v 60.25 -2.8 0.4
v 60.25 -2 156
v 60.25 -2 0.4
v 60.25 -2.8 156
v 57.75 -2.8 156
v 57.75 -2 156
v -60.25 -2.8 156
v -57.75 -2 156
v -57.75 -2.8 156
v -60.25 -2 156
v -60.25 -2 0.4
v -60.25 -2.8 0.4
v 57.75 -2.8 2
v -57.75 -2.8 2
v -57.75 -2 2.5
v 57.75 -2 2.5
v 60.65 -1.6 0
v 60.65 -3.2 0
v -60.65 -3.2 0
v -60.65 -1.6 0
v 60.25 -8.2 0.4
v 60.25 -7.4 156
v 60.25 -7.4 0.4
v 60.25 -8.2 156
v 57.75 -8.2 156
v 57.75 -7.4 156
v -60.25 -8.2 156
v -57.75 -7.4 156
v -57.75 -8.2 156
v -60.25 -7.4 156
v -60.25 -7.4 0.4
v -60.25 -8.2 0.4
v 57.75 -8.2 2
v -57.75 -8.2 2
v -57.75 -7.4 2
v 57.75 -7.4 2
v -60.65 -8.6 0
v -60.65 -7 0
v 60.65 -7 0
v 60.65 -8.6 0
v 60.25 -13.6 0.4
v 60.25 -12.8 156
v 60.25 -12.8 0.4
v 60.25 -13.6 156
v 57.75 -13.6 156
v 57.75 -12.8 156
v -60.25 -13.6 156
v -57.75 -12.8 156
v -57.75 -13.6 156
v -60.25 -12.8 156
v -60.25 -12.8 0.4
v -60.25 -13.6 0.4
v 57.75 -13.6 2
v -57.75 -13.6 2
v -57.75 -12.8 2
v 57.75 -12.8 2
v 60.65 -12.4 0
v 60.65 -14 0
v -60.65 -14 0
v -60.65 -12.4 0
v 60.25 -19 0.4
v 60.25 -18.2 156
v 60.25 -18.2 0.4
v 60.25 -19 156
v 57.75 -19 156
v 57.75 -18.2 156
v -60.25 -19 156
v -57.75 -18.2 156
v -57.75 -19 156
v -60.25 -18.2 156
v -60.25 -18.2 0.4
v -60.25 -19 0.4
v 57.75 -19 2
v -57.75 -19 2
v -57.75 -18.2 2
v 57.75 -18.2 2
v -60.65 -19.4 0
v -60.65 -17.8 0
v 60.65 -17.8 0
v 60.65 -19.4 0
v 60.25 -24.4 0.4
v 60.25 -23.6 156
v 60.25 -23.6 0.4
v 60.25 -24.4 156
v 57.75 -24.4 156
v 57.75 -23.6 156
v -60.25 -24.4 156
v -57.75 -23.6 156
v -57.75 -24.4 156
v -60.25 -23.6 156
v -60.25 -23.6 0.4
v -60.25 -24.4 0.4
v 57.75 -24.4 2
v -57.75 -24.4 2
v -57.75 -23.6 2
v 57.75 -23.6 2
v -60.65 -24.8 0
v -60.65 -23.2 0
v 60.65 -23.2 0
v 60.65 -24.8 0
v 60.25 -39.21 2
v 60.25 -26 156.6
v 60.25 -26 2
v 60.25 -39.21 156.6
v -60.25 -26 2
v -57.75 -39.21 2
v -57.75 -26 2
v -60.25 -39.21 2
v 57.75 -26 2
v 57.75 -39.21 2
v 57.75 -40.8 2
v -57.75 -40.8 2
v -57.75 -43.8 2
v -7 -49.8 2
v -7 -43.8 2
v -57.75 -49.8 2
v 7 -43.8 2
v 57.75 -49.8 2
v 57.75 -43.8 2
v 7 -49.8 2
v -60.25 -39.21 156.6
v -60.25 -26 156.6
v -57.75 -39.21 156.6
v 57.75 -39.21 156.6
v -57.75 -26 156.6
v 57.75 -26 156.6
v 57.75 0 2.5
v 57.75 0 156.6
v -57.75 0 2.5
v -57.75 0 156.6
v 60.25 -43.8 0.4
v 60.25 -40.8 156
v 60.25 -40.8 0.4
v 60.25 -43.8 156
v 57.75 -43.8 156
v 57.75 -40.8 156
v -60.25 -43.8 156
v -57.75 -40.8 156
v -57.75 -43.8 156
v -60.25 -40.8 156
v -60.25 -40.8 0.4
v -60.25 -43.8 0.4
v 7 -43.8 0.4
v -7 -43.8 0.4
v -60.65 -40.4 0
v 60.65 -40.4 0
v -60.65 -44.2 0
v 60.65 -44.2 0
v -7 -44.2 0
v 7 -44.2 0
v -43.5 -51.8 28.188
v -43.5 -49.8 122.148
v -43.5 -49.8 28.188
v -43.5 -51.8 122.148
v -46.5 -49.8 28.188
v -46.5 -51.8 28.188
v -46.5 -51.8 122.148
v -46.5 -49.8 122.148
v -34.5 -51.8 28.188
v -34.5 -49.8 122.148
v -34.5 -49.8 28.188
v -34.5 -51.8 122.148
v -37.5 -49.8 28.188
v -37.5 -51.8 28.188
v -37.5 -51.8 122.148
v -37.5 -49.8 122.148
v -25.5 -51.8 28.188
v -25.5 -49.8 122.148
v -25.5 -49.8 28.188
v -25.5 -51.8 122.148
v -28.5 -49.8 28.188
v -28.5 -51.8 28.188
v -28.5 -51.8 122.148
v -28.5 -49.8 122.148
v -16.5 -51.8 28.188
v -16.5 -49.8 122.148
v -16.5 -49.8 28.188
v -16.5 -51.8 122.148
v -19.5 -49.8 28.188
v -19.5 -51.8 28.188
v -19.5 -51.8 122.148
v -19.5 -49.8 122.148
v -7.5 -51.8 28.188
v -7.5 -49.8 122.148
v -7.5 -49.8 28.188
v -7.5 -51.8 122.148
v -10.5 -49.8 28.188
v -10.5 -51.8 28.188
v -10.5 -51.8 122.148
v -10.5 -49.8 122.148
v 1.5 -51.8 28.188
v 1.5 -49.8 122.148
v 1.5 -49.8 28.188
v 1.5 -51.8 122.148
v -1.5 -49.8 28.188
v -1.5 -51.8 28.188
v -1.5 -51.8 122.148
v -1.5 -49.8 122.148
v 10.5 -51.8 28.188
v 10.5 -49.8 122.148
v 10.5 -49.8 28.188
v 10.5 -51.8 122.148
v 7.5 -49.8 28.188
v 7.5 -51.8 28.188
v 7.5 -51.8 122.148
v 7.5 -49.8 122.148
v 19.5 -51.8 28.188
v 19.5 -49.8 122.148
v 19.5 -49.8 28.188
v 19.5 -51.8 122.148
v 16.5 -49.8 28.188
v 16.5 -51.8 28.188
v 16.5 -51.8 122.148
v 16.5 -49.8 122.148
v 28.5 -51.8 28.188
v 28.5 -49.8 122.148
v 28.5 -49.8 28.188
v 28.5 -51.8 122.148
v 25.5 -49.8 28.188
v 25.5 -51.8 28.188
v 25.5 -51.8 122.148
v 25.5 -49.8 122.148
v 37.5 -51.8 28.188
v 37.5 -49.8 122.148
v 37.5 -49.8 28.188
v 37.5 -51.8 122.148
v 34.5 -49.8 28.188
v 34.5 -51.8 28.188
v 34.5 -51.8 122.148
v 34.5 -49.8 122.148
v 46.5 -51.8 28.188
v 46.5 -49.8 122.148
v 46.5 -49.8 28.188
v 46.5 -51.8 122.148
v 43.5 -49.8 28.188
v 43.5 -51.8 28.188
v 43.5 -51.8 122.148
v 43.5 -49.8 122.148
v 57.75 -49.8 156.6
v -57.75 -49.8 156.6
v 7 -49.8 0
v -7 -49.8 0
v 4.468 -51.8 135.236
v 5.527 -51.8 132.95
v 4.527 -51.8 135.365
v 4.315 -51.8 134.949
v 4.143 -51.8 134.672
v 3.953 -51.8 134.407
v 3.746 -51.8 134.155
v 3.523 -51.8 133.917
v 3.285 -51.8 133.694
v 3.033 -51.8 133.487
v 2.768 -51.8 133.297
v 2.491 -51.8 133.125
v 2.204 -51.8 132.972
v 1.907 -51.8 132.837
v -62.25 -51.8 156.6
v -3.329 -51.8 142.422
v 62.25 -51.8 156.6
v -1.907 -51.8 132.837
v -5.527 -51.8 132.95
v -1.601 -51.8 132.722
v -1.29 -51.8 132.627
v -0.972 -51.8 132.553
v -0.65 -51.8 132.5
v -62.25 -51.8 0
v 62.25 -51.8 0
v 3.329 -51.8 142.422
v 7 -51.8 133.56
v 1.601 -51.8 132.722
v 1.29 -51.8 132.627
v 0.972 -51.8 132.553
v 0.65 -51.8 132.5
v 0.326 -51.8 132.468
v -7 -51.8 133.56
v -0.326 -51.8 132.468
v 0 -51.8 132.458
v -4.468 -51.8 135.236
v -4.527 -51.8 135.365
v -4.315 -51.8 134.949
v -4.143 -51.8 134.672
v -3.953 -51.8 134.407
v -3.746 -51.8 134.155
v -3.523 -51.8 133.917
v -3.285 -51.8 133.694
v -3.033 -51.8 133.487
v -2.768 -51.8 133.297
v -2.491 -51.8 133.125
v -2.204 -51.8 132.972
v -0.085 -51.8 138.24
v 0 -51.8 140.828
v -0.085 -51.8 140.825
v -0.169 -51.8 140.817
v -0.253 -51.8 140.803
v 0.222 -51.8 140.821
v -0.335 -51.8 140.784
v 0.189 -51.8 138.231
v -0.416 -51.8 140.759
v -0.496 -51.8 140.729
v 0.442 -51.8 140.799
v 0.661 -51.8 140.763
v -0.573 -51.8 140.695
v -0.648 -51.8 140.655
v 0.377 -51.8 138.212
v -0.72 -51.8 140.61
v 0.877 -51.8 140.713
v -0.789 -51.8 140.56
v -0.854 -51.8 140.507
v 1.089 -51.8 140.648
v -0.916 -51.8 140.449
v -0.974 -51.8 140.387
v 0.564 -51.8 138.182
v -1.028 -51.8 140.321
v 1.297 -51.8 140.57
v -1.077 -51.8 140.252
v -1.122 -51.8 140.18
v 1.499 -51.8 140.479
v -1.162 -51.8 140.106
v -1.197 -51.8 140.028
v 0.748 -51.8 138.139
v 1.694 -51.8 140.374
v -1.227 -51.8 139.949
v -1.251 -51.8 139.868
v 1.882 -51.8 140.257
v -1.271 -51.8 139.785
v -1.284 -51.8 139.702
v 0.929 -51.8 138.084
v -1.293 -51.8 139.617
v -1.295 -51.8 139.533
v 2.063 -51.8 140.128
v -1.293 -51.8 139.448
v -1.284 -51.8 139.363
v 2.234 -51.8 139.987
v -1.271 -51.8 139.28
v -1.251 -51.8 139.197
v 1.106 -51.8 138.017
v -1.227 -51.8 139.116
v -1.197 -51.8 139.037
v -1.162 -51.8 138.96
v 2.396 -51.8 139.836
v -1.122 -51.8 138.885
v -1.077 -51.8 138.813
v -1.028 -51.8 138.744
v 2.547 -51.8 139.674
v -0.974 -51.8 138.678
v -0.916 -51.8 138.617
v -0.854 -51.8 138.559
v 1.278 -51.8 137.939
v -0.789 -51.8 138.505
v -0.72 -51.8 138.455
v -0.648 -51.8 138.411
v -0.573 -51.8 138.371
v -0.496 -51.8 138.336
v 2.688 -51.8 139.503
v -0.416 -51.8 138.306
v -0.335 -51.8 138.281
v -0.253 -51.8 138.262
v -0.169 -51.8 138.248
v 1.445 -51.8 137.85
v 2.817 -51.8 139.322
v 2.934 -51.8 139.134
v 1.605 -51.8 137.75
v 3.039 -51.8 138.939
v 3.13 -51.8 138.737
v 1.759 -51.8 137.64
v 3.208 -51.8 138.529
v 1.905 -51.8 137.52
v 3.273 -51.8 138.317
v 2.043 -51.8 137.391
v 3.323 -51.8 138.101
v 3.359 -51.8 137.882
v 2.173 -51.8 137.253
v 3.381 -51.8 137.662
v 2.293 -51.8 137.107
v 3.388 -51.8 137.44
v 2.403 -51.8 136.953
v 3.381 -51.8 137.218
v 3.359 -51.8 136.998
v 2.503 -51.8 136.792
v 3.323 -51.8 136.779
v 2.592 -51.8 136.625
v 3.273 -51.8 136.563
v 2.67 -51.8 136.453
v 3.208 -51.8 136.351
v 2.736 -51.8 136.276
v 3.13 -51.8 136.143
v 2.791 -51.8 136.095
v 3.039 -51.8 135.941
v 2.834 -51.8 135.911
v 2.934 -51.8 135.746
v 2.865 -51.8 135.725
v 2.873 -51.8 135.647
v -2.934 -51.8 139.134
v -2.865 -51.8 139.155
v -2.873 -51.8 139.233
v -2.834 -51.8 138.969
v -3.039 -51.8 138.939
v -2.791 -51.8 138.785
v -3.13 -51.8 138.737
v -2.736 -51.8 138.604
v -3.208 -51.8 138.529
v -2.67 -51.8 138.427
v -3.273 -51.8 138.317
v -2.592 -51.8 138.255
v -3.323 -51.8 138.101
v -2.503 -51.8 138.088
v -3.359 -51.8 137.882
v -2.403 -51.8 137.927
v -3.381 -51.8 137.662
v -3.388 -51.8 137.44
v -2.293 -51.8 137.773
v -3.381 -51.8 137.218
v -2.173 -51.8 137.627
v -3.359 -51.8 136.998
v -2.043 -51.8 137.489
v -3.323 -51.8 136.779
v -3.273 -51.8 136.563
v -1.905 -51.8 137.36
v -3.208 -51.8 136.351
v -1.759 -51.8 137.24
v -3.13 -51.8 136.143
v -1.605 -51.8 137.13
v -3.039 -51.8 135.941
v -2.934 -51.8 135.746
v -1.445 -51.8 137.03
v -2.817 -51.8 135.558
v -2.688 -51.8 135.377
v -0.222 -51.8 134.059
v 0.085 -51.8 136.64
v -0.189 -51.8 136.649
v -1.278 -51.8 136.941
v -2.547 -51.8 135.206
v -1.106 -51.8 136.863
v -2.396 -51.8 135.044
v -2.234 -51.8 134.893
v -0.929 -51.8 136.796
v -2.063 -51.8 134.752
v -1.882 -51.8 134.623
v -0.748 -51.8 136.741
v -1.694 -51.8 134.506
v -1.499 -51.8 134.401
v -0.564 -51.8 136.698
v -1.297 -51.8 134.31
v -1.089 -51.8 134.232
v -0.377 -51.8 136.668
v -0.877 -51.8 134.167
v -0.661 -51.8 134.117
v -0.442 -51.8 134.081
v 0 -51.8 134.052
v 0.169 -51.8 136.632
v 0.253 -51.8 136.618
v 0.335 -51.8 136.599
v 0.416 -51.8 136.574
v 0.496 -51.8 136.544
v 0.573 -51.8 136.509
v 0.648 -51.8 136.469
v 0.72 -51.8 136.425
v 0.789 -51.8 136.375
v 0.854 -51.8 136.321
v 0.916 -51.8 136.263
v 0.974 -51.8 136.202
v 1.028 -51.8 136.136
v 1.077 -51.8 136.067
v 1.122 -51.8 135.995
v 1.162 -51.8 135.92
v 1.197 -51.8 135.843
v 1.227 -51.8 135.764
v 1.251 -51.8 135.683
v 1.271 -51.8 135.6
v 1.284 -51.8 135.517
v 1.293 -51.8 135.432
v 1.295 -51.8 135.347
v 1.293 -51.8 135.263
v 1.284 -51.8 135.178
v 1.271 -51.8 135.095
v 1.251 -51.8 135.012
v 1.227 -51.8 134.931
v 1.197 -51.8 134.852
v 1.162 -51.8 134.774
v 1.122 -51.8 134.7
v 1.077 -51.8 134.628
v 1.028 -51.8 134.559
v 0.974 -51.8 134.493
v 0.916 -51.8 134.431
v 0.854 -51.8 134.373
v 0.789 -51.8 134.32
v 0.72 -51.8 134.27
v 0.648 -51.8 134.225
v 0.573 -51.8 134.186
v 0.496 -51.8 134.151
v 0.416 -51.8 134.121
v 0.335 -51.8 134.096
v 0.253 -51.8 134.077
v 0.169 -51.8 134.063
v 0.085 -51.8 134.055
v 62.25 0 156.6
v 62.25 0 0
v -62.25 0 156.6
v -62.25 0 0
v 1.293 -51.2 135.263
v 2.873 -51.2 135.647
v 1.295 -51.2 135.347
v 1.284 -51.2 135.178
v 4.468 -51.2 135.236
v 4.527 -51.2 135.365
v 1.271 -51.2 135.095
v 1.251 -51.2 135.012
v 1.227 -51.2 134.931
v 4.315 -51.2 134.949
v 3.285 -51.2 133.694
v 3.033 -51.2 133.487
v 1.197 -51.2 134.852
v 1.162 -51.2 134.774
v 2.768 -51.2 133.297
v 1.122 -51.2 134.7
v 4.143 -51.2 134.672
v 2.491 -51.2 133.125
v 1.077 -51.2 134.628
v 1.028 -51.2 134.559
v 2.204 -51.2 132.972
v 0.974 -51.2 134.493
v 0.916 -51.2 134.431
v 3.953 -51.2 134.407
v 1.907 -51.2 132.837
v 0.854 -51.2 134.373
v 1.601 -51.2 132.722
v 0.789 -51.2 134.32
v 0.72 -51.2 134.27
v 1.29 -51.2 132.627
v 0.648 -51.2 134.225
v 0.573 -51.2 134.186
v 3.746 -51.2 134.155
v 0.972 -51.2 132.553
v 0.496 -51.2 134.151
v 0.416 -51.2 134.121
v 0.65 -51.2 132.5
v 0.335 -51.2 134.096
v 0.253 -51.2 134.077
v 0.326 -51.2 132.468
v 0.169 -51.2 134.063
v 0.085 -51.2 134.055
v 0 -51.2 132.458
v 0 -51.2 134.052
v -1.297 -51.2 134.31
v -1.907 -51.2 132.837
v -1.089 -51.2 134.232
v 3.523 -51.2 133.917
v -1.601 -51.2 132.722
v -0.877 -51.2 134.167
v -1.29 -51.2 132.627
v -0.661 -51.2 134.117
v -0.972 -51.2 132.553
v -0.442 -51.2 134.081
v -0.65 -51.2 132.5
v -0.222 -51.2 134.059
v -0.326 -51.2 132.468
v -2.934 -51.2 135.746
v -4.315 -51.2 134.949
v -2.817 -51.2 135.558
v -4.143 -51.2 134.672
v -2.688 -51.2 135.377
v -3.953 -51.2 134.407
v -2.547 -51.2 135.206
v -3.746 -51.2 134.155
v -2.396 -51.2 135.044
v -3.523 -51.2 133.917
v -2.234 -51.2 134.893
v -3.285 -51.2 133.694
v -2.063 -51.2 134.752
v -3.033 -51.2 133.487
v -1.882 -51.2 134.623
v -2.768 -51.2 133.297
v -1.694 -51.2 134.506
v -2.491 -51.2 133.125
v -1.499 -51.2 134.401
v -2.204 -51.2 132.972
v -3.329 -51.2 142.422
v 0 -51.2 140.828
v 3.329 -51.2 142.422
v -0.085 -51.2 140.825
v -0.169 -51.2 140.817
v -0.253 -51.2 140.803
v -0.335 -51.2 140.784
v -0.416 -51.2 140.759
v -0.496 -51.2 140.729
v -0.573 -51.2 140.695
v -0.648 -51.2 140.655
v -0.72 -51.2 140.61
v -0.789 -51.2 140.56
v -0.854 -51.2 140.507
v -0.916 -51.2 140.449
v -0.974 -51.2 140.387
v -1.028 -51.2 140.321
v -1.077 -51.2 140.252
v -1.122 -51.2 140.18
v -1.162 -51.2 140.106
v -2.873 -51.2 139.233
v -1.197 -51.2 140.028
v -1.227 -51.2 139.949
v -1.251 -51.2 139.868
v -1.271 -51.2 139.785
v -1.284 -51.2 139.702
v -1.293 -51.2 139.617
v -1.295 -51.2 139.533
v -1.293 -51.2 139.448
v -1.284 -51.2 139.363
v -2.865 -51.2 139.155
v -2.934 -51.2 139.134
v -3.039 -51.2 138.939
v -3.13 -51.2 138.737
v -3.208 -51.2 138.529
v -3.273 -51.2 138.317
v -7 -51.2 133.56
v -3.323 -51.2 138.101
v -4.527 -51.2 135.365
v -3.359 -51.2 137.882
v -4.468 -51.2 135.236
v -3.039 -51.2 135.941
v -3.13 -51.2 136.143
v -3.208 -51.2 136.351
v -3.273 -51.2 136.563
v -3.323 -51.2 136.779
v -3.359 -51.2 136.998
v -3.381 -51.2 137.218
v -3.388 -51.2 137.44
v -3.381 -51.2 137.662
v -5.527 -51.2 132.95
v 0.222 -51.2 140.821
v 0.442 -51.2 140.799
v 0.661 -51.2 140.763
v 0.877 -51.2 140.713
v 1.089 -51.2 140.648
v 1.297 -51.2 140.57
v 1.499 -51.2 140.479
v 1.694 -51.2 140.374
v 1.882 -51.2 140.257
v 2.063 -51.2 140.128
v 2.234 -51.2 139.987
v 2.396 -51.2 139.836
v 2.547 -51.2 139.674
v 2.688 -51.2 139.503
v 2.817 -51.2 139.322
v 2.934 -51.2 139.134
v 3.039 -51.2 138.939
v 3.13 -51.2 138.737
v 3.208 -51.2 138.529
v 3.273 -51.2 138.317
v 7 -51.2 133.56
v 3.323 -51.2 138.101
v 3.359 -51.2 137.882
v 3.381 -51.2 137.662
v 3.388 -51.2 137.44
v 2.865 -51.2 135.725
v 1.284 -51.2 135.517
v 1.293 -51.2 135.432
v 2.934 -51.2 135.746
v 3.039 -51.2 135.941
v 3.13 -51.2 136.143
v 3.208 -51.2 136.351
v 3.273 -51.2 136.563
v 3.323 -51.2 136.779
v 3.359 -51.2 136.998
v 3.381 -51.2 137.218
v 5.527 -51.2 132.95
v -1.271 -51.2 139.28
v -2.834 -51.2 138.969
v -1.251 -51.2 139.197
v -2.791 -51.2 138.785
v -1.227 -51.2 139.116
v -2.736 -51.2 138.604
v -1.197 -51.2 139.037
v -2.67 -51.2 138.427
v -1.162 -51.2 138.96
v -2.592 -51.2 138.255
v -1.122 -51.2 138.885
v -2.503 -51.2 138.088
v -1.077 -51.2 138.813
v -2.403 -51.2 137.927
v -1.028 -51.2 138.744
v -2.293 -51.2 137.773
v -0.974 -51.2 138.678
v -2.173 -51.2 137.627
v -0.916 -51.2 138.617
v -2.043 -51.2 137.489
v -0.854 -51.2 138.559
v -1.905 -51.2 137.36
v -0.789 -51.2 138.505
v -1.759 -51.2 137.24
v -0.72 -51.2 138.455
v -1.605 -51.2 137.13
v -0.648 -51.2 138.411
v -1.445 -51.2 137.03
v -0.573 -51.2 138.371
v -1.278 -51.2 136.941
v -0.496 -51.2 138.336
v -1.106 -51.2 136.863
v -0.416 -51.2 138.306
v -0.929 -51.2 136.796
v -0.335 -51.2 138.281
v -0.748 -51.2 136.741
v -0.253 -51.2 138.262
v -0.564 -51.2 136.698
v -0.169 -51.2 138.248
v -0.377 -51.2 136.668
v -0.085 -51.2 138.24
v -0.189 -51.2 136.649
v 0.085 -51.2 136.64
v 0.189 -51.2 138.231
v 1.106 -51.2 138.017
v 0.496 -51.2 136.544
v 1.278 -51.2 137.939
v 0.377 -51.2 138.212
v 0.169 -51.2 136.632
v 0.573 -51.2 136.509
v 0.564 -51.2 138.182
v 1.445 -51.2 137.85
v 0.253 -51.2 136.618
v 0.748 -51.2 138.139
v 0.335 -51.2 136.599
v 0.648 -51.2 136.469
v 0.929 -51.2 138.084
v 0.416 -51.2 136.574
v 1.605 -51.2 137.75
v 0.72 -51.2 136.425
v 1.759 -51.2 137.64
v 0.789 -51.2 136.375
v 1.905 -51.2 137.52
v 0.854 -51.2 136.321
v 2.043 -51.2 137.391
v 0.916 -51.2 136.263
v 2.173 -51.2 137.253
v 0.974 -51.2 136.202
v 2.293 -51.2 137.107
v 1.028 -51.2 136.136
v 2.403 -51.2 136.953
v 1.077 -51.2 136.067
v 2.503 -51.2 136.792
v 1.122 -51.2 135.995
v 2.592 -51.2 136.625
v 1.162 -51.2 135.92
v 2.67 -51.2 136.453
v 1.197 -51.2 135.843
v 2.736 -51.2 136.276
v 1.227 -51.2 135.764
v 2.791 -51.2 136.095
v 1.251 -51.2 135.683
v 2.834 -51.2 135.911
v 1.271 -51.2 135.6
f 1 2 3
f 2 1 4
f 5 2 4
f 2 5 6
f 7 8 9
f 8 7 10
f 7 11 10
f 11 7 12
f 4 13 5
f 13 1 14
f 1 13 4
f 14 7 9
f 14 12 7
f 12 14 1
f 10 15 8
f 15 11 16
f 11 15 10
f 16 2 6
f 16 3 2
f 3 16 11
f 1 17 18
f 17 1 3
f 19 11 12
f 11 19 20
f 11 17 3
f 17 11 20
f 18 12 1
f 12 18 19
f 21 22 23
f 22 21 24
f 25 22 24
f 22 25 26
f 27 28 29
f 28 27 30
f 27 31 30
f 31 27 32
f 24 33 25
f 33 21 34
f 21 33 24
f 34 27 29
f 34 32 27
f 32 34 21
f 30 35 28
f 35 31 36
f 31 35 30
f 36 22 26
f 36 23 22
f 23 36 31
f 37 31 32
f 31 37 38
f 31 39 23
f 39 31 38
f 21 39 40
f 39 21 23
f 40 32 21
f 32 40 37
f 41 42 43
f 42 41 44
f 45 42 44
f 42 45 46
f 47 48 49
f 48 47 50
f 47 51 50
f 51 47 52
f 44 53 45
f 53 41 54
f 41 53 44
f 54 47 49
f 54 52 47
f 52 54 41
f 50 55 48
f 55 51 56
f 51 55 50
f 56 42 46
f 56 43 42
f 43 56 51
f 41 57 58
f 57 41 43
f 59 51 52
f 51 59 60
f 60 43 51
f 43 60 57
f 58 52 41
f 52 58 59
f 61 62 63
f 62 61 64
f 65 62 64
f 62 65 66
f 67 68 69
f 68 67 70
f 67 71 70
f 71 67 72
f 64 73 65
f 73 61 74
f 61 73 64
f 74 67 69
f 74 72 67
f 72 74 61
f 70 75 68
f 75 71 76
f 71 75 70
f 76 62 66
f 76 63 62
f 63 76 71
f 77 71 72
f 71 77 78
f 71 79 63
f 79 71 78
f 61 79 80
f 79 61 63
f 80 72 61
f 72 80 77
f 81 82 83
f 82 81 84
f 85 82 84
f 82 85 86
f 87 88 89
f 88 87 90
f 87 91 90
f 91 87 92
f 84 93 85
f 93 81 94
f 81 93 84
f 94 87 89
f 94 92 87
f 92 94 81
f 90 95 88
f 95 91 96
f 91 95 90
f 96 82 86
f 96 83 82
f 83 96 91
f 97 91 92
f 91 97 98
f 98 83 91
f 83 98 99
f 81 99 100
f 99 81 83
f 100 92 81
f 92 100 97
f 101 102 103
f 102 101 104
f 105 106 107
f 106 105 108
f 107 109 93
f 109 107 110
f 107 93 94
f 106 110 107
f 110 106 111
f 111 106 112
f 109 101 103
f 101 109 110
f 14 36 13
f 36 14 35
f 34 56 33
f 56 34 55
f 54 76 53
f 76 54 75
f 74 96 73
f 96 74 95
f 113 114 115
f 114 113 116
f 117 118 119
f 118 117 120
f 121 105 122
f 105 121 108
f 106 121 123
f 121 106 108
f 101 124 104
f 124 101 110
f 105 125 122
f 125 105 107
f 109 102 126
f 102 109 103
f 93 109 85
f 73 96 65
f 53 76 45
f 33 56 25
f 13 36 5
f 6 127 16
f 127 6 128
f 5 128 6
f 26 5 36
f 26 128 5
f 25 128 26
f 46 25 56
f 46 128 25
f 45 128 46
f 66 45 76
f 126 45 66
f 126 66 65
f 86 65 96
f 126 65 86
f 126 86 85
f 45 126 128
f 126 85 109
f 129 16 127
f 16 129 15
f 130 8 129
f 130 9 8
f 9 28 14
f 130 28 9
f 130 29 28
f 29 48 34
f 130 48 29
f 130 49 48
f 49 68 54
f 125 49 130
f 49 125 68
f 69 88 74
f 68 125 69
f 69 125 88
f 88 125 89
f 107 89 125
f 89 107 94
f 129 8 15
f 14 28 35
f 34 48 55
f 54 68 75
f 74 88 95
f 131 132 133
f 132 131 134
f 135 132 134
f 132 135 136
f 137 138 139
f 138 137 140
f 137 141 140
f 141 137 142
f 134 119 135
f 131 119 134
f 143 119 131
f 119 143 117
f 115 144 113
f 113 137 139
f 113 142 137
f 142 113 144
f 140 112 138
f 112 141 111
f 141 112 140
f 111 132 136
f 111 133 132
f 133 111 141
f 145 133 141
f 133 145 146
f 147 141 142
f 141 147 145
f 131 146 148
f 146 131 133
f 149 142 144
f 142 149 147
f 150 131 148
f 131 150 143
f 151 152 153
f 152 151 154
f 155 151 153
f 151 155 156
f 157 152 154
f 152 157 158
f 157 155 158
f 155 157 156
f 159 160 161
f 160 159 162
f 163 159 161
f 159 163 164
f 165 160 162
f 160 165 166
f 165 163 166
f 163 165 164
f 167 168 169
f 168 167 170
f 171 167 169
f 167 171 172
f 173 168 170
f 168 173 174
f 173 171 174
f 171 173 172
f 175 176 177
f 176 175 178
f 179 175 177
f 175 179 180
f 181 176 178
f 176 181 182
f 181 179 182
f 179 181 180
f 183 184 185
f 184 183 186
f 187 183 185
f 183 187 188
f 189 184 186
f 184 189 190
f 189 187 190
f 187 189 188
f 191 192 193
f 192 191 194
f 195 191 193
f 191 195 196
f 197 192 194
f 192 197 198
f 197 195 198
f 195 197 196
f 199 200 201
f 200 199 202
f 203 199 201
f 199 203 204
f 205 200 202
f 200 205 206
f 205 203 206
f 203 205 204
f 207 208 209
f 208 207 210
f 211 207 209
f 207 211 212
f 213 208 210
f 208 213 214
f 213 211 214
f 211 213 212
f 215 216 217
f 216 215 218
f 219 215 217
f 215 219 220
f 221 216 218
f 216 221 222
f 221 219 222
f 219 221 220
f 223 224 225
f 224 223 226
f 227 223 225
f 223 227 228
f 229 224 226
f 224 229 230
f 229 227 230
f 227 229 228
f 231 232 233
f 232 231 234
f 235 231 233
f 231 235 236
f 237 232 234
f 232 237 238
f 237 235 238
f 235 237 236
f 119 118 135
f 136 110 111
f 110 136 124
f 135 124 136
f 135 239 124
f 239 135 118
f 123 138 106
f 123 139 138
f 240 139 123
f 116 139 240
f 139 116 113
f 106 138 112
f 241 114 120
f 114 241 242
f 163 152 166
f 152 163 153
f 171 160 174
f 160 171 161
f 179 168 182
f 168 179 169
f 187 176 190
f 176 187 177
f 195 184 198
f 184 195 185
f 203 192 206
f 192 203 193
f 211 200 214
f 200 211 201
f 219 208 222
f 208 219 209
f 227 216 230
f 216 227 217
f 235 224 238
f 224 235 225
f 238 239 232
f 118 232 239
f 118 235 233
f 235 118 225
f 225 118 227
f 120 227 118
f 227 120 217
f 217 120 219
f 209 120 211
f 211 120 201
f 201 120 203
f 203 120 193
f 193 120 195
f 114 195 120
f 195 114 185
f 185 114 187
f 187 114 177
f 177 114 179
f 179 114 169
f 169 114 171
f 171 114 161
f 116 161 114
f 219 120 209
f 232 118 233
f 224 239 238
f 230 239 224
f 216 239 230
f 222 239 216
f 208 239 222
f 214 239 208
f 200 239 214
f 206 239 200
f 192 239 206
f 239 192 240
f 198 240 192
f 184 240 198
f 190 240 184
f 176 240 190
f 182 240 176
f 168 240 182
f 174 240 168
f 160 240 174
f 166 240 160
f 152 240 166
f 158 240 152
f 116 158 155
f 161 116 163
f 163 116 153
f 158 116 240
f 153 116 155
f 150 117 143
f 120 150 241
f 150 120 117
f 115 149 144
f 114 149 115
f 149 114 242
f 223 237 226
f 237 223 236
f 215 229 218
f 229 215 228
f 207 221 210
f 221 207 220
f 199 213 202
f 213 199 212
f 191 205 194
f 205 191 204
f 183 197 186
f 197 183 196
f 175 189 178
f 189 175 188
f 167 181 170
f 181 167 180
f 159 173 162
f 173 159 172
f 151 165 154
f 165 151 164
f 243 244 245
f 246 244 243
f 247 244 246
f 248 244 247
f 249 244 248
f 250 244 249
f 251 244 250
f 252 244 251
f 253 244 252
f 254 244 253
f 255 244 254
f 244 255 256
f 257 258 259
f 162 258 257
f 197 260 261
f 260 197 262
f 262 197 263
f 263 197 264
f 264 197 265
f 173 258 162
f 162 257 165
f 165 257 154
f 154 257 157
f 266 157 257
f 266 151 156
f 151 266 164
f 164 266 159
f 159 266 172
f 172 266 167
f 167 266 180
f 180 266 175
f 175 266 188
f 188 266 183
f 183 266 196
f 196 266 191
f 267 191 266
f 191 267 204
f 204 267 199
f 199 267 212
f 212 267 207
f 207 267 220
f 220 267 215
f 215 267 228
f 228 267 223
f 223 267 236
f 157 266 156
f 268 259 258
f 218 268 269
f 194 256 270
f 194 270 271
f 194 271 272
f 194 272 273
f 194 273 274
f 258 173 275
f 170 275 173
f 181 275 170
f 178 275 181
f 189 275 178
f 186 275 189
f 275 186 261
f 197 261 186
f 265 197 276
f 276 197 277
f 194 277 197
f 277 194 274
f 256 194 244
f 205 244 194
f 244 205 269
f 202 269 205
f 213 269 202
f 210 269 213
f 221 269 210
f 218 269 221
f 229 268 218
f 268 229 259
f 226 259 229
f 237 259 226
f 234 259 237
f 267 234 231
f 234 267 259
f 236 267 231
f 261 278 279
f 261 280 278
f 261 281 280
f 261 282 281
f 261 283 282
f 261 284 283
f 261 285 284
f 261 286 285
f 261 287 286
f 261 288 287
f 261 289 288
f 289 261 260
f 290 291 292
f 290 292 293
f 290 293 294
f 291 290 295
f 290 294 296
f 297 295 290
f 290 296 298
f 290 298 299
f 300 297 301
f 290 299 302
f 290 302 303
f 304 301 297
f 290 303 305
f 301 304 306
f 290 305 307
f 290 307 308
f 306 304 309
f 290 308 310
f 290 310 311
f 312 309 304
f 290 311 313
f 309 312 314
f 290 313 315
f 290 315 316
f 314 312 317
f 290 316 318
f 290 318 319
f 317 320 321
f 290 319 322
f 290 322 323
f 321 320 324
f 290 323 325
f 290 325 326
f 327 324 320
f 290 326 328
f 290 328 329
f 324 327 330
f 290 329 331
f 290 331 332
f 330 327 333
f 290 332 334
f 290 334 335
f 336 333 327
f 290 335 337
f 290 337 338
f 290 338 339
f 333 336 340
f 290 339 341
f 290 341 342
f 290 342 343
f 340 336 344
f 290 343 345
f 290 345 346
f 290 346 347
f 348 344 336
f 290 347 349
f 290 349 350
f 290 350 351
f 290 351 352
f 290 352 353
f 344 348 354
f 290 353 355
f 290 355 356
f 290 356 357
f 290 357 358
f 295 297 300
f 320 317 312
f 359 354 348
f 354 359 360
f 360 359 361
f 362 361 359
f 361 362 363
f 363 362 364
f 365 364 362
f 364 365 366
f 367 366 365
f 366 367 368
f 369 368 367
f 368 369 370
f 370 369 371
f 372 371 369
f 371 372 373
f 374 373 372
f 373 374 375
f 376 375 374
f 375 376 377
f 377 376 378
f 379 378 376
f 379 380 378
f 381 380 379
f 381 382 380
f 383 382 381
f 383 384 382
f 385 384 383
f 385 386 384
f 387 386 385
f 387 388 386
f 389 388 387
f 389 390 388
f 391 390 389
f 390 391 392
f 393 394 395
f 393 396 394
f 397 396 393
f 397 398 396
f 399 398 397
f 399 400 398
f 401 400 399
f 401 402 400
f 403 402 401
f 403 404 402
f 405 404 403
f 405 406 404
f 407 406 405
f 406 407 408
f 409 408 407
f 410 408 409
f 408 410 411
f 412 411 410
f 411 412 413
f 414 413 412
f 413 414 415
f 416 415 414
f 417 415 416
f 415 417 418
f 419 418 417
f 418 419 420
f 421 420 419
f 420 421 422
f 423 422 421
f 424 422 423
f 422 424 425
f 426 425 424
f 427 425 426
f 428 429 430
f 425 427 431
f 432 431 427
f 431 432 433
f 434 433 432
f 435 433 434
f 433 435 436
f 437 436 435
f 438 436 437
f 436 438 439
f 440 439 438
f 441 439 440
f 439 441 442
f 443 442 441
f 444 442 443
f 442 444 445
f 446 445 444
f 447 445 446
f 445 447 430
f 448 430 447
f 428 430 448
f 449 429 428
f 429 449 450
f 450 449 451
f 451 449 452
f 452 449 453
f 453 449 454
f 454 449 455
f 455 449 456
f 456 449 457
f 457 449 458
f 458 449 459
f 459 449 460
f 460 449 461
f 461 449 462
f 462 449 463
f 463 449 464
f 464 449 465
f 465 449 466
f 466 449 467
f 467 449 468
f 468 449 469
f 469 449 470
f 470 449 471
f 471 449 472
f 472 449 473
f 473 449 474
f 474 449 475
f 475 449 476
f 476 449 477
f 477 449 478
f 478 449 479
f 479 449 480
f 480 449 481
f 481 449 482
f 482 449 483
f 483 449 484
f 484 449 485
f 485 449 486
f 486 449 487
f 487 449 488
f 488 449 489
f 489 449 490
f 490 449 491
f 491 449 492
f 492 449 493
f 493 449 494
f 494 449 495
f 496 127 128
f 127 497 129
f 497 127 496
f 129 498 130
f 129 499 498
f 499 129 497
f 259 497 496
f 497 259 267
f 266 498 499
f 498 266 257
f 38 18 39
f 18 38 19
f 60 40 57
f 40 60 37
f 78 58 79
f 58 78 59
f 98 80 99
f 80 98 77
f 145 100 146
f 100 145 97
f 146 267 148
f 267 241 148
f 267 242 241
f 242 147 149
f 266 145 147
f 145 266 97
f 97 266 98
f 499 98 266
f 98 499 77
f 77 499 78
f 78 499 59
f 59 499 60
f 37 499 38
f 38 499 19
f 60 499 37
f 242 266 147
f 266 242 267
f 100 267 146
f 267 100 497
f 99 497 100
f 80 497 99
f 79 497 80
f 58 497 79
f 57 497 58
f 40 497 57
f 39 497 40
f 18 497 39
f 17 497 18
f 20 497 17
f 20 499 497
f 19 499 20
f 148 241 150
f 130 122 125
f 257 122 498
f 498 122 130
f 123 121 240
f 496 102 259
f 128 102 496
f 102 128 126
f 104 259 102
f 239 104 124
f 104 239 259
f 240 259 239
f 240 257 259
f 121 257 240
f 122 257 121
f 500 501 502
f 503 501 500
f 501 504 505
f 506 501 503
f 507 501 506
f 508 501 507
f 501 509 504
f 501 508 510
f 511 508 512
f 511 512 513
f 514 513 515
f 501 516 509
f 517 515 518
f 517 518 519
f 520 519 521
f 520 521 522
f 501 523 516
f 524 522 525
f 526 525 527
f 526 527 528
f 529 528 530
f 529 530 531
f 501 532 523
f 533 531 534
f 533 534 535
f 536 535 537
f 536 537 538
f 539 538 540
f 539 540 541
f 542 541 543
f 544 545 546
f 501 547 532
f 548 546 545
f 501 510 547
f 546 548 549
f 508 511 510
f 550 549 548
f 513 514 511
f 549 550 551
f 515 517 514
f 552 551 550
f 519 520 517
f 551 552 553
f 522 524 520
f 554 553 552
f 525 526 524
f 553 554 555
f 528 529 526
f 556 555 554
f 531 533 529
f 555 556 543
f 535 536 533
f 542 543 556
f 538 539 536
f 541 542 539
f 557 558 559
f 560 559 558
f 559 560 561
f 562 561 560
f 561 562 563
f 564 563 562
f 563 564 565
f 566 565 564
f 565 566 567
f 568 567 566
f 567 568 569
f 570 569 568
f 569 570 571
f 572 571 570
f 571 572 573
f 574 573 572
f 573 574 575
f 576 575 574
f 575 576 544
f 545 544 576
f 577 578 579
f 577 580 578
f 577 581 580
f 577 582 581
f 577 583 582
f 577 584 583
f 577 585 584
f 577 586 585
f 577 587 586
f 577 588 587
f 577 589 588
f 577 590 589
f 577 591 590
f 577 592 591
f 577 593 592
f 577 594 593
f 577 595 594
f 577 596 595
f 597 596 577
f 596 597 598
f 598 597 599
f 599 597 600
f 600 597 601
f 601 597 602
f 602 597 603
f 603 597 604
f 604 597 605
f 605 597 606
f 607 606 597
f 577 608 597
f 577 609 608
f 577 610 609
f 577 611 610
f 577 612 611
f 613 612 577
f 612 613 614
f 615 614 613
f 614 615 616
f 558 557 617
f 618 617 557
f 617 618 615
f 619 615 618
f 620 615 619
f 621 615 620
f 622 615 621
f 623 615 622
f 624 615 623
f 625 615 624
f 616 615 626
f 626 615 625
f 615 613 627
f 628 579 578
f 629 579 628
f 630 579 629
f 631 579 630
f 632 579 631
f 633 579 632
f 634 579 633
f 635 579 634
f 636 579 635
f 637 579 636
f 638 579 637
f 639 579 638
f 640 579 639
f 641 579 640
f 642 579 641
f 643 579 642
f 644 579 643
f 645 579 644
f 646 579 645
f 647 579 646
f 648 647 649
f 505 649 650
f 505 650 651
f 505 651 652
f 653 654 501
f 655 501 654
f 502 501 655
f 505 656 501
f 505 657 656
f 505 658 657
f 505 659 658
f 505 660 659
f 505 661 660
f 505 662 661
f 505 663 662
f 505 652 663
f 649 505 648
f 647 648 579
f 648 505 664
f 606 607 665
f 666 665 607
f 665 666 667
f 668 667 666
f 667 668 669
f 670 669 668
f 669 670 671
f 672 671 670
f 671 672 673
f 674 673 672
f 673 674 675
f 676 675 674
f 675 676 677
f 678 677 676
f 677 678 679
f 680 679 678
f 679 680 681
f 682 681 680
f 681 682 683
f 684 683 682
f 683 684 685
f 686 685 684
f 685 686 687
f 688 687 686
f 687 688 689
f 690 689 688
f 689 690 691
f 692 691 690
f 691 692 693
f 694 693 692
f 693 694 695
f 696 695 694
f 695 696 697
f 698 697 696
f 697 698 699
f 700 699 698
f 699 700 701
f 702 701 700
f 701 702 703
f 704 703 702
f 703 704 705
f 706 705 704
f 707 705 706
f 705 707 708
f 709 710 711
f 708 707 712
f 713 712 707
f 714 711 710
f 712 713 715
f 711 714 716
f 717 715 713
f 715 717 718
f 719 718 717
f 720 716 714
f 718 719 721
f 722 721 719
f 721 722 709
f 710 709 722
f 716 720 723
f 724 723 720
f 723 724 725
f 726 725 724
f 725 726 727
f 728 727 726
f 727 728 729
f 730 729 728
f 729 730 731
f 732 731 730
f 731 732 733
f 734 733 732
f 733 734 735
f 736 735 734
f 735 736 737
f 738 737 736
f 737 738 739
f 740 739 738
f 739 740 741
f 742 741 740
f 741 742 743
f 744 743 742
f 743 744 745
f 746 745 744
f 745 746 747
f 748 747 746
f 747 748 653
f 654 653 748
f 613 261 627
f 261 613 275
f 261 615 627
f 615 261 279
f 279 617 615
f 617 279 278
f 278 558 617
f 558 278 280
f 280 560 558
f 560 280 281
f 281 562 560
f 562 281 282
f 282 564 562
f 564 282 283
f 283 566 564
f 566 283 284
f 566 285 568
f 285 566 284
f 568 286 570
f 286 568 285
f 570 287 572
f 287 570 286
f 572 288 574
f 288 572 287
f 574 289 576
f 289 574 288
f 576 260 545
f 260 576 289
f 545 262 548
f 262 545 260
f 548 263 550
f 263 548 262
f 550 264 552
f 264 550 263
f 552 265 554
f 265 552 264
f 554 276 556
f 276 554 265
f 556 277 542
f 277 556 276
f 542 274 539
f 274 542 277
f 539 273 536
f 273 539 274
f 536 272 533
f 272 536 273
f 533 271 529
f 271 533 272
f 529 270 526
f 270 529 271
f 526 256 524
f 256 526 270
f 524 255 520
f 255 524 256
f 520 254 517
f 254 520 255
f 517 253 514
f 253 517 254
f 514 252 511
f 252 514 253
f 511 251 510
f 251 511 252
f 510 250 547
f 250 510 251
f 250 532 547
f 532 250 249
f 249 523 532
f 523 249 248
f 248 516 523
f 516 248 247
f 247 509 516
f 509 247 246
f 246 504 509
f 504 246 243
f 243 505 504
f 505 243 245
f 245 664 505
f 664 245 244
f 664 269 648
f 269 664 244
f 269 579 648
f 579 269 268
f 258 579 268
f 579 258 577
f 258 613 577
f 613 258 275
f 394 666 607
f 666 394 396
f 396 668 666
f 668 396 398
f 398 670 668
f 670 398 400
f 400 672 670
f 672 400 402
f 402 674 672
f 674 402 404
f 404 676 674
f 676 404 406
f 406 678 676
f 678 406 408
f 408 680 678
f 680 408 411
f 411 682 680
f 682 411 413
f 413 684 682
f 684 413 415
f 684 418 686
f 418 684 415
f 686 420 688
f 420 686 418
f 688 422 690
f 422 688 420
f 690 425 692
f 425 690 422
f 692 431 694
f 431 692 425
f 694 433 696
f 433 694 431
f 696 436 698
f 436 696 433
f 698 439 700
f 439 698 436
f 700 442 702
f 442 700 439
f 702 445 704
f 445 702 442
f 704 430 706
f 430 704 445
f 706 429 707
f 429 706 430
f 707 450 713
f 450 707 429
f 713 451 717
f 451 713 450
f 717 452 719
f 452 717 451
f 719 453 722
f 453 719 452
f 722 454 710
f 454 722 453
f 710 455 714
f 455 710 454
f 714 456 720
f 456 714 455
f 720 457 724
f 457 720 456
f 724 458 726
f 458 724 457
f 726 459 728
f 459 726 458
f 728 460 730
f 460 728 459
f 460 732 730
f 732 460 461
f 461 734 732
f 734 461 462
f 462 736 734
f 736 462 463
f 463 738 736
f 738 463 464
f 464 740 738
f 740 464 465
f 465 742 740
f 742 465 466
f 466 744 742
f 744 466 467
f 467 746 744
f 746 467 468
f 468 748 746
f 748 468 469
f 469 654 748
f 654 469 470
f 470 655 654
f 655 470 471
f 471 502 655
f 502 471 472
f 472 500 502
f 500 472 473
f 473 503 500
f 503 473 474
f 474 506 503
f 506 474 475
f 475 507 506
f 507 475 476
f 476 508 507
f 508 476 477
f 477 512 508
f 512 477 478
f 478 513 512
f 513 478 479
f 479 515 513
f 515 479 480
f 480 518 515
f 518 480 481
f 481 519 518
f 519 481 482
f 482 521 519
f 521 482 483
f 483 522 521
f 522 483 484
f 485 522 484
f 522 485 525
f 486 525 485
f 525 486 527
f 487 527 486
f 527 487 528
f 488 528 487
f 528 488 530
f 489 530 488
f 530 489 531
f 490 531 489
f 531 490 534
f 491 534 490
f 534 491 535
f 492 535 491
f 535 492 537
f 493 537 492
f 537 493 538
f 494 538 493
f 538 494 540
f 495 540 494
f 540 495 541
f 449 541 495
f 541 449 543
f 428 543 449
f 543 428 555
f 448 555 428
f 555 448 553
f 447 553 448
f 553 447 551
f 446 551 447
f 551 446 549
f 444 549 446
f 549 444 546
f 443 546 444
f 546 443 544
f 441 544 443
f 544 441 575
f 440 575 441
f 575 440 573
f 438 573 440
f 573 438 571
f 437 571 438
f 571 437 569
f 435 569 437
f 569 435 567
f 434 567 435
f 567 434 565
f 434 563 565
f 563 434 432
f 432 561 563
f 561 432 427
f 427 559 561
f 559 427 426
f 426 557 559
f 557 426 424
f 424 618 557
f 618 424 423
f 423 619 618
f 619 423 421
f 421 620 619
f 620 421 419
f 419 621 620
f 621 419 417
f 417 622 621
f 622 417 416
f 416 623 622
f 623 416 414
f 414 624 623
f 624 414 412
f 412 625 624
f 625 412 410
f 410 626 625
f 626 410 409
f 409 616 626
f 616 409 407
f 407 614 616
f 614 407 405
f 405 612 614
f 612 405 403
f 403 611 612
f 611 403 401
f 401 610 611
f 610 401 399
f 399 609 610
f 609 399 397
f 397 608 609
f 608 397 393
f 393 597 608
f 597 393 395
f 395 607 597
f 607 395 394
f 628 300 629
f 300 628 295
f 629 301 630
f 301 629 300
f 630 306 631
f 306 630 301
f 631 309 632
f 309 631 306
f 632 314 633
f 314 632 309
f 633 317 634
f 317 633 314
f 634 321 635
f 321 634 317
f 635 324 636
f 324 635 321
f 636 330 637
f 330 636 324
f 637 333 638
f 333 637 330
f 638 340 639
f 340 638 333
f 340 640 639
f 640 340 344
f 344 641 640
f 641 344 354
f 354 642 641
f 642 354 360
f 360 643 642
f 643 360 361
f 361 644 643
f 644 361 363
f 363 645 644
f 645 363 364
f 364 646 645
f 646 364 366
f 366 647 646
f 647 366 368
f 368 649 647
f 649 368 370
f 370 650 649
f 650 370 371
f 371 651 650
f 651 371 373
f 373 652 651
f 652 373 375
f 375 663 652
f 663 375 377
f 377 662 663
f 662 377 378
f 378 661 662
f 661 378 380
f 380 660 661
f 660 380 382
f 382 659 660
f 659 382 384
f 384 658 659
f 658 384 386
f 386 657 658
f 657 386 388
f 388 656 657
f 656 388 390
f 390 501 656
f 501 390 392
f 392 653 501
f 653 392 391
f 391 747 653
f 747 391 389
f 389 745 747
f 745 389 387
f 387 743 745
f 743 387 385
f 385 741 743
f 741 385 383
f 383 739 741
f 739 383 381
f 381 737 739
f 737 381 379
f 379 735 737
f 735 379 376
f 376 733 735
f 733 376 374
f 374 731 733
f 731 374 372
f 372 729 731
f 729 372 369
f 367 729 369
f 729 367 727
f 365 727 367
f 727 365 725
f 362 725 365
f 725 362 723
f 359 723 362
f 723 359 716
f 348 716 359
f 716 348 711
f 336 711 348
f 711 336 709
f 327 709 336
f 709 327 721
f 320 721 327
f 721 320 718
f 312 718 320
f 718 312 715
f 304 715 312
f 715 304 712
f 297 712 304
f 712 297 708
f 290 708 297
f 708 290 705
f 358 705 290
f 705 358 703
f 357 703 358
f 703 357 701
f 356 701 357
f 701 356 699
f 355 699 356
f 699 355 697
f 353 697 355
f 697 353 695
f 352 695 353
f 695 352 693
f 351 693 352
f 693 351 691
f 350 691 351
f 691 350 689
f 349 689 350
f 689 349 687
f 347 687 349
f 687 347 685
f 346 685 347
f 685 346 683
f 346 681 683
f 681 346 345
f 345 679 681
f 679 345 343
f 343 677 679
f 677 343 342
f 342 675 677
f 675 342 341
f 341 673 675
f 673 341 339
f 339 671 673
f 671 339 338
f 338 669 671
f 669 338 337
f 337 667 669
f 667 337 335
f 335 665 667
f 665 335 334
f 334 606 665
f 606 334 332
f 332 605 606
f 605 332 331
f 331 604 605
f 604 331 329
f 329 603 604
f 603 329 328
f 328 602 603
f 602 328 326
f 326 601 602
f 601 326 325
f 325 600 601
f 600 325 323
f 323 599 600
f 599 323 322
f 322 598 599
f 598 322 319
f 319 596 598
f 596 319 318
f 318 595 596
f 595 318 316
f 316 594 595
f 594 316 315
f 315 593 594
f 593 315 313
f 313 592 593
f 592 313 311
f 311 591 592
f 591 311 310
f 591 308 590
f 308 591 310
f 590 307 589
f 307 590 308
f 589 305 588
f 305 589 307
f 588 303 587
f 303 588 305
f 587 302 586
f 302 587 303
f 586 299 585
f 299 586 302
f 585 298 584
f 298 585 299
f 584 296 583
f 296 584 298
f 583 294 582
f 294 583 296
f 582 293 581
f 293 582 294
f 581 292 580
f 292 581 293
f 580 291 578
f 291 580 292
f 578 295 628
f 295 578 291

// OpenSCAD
// Copyright (C) [Jonas Immanuel Frey] - Licensed under GPL
// Paper light box V1: a box with slits in its top. A sheet slides into each
// slit, paper or a thin print with a picture cut out, and a light behind the
// last one shines through them all. Standalone, no libraries. Millimetres.
// Print it upside down, the top wall with the slits on the bed, no support.
//
//   - The sheets stand in grooves of the two side walls and rest on stops at
//     the grooves' lower ends. The bottom is open: lift the box and push a
//     sheet up from below to take it out.
//   - light = "board": Bambu's CMYK backlight board slides into a slit of its
//     own behind the last sheet, its USB plug at the top.
//   - light = "puck": the RGBW puck light KC007 drops into a pocket behind the
//     back wall, its lens in a slot of that wall. Pushed from behind through
//     the hole, the lens is pressed against the slot's edge and clicks.
//   - The sheets and their pictures come from the webapp beside this script;
//     it sets sheet_thicknesses and renders the box with this script.
// The script echoes the box's size and where the slits are.

/* [1 - Start here] */
part = "print"; // [print:Box as it is printed - the top wall on the bed,box:Box as it stands,assembly:Box with its sheets and the light,section:Assembly cut in half]
// Width of the sheets.
sheet_x = 120; // [70:0.5:300]
// Height of the sheets.
sheet_y = 156; // [80:0.5:300]
// Number of sheets, if sheet_thicknesses is empty.
sheet_count = 5; // [1:1:20]
// Thickness of the sheets, if sheet_thicknesses is empty.
sheet_thickness = 0.4; // [0.1:0.05:3]
// Thickness of every sheet from the front to the back, as [0.4, 0.4, 0.2]. Empty: sheet_count sheets of sheet_thickness.
sheet_thicknesses = [];
// Free space between two sheets.
sheet_distance = 5; // [2.5:0.5:40]
light = "board"; // [board:Bambu CMYK backlight board 120 x 156,puck:RGBW puck light KC007]
// From the last sheet to the light's wall. More spreads the light wider: 30 or more for the puck.
light_distance = 15; // [5:1:100]

/* [2 - Fit] */
// A slit is this much wider than its sheet.
slot_clearance = 0.4; // [0.1:0.05:1]
// No slit is narrower than this: narrower ones close up in the print.
slot_min = 0.8; // [0.4:0.05:1.5]
// The room between the side walls is this much wider than the sheets, both sides together.
side_clearance = 0.5; // [0:0.1:2]
// How far the sheets' edges reach into the grooves of the side walls.
groove_depth = 2.5; // [1:0.5:6]
// Stops under the grooves carry the sheets. A multiple of the layer height.
stop_height = 0.6; // [0.2:0.2:2]

/* [3 - Box] */
// Side walls and back wall.
wall = 2; // [1.2:0.2:4]
// Top wall with the slits, on the bed in the print.
top = 2; // [1:0.2:4]
// Lips in front of the first sheet.
front_lip = 2; // [1.2:0.2:5]
// Ribs beside a slit, where the space between two slits is wide enough to be hollow.
rib = 1.6; // [1.2:0.2:3]
// Chamfer of the slits' mouths.
chamfer = 0.4; // [0:0.1:1]

/* [4 - Backlight board] */
// The board stands upright behind upright sheets and lies behind wide ones.
board_x = 120; // [50:0.5:300]
board_y = 156; // [50:0.5:300]
// The board's slit: the board, its LEDs and play.
board_slot = 3; // [1.5:0.1:6]
// Room behind the board, for the USB socket on its back and for air.
board_back = 6; // [3:0.5:15]
// Opening for the USB plug, at the middle of the board's short edge: in the top wall behind an upright board, in the right side wall beside a lying one. 0: none.
plug_notch = 14; // [0:1:25]
// Slots in the back wall: the board gets warm.
vents = true;

/* [5 - Puck light] */
// The manufacturer's CAD model, as in RGBW_pucklight_holder_ringclick: 62 across, the flat ring around the lens 21 high, the lens 40 across and 26.8 high at its top.
puck_d = 62; // [40:0.1:90]
puck_height = 26.8; // [10:0.1:50]
puck_edge_height = 21; // [5:0.1:45]
puck_dome_d = 40; // [20:0.1:80]
// Around the puck in its pocket, per side.
puck_clearance = 0.5; // [0.2:0.1:1.5]
// How far the puck moves in its pocket before the lens meets the slot's edge.
puck_play = 0.7; // [0.2:0.1:2]
// Width of the slot the lens looks through: its edge presses the lens there.
contact_d = 36; // [20:0.5:60]
// Hole in the back to push the puck.
press_d = 30; // [10:1:50]

/* [6 - Logo] */
// Engraved in the back.
logo = true;
logo_width = 14; // [8:0.5:30]
logo_depth = 0.6; // [0.2:0.2:1.2]

/* [Hidden] */
eps = 0.01;
$fn = 96;

// ---- sheets ----
t = len(sheet_thicknesses) > 0 ? sheet_thicknesses : [for (i = [1 : sheet_count]) sheet_thickness];
n = len(t);
slot = [for (v = t) max(v + slot_clearance, slot_min)];
// Middle of sheet i behind the box's front face.
function centre(i) = i == 0 ? front_lip + slot[0] / 2
    : centre(i - 1) + t[i - 1] / 2 + sheet_distance + t[i] / 2;
c = [for (i = [0 : n - 1]) centre(i)];
// The solid between slit i and the next one, or the light's wall.
function tooth(i) = (i < n - 1 ? c[i + 1] - slot[i + 1] / 2 : y_j) - c[i] - slot[i] / 2;
y_last = c[n - 1] + t[n - 1] / 2;
// The light's wall: an aperture in front of the board, the wall with the puck's slot.
y_j = y_last + light_distance;

is_board = light == "board";
landscape = sheet_x > sheet_y;
board = landscape ? [board_y, board_x] : [board_x, board_y];
height = stop_height + max(sheet_y, is_board ? board[1] : 0);
pocket_a = sheet_x + side_clearance;
clear_a = pocket_a - 2 * groove_depth;
w_a = pocket_a + 2 * wall;
sheet_top = stop_height + sheet_y;
// Lower edge of the bar above the window: it hides the sheets' top as the grooves hide their sides.
apron_z = sheet_top - groove_depth;

// ---- board ----
pocket_b = board[0] + side_clearance;
clear_b = pocket_b - 2 * groove_depth;
w_b = pocket_b + 2 * wall;
jw = is_board ? rib : wall;
y_slit = y_j + jw;
y_room = y_slit + board_slot;
y_back = y_room + board_back;
board_top = stop_height + board[1];
aperture = min(clear_a, clear_b);
aperture_z = min(height - top, sheet_top, board_top);
plug_z = stop_height + board[1] / 2;

// ---- puck ----
puck_r = puck_d / 2;
dome_r = puck_dome_d / 2;
dome_h = puck_height - puck_edge_height;
dome_R = (dome_r * dome_r + dome_h * dome_h) / (2 * dome_h);
// The lens's height above the flat ring around it, at radius r.
function lens_z(r) = sqrt(dome_R * dome_R - r * r) - (dome_R - dome_h);
contact_r = contact_d / 2;
pocket_r = puck_r + puck_clearance;
// From the wall the lens leans on to the pocket's back: the puck and its play.
pocket_depth = lens_z(contact_r) + puck_edge_height + puck_play;
// The puck lies in a V, behind the middle of the sheets if the V has room above the table.
puck_z = max(stop_height + sheet_y / 2, (pocket_r + wall) * sqrt(2));
v_apex = puck_z - pocket_r * sqrt(2);

depth = is_board ? y_back + wall : y_slit + pocket_depth + wall;
width = is_board ? max(w_a, w_b) : w_a;

assert(n >= 1, "at least one sheet");
assert(min([for (i = [0 : n - 1]) tooth(i)]) >= 1.2 + 2 * chamfer,
    "sheet_distance or light_distance too small: less than 1.2 + 2 chamfer stays between two slits");
assert(contact_r < dome_r, "contact_d must be smaller than the lens, puck_dome_d");
assert(is_board || puck_z + pocket_r <= height, "sheet_y too small: the puck would stand out of the top");
assert(is_board || w_a >= 2 * (pocket_r + wall), "sheet_x too small for the puck's pocket");

echo(str("box ", width, " x ", depth, " x ", height, " mm (width, depth, height); printed upside down, ", height, " high"));
echo(str(n, " sheets ", sheet_x, " x ", sheet_y, ", seen through a window ", clear_a, " wide and ", apron_z, " high from the table"));
function slit_list(i = 0) = i == n ? "" : str(i > 0 ? ", " : "", c[i], " / ", slot[i], slit_list(i + 1));
echo(str("slits from the front, middle / width: ", slit_list()));
echo(is_board
    ? str("board ", board[0], " x ", board[1], landscape ? ", lying, its plug in the right side wall" : ", upright, its plug in the top wall",
        "; slit ", board_slot, " wide, ", y_slit, " behind the front")
    : str("puck: pocket ", 2 * pocket_r, " wide and ", pocket_depth, " deep, its middle ", puck_z, " above the table; the lens ",
        lens_z(contact_r), " above its flat ring where the slot's edge meets it"));

// ---- parts ----
if (part == "print") translate([0, 0, height]) rotate([180, 0, 0]) box();
else if (part == "box") box();
else if (part == "assembly") assembly();
else if (part == "section") difference() {
    union() { assembly(); }
    translate([0, -250, -250]) cube([500, 1000, 1000]);
}

// A 2D shape in x and z, made a solid from y0 to y1.
module along_y(y0, y1) {
    translate([0, y1, 0]) rotate([90, 0, 0]) linear_extrude(y1 - y0) children();
}

// A slit through the top wall down to z0, its mouth chamfered.
module slit(w, y0, y1, z0) {
    translate([-w / 2, y0, z0]) cube([w, y1 - y0, height - z0 + 1]);
    if (chamfer > 0) hull() {
        translate([-w / 2, y0, height - chamfer]) cube([w, y1 - y0, eps]);
        translate([-w / 2 - chamfer, y0 - chamfer, height]) cube([w + 2 * chamfer, y1 - y0 + 2 * chamfer, 1]);
    }
}

// A pocket half_w to each side of x = 0 up to top_z, its bottom a 90 degree V.
module v_profile(half_w, apex_z, top_z) {
    polygon([[-half_w, top_z], [-half_w, apex_z + half_w], [0, apex_z], [half_w, apex_z + half_w], [half_w, top_z]]);
}

module box() {
    difference() {
        body();
        sheet_cuts();
        if (is_board) board_cuts(); else puck_cuts();
        if (logo) translate([0, depth, logo_z()]) rotate([90, 0, 180]) logo_cut(logo_width);
    }
}

function logo_z() = is_board ? min(0.1 * height, 16) + logo_width / 4 : puck_z + press_d / 2 + 3 + logo_width * logo_r / logo_w;

module body() {
    union() {
        if (is_board) {
            linear_extrude(height) union() {
                translate([-w_a / 2, 0]) square([w_a, y_j + eps]);
                translate([-width / 2, y_j]) square([width, jw]);
                translate([-w_b / 2, y_slit - eps]) square([w_b, depth - y_slit + eps]);
            }
        } else difference() {
            // one block, and all that is not the pocket's tower cut away behind the wall:
            // a tower joined on would leave slivers where its faces lie in the block's
            translate([-w_a / 2, 0, 0]) cube([w_a, depth, height]);
            along_y(y_slit, depth + 1) difference() {
                translate([-w_a / 2 - 1, -1]) square([w_a + 2, height + 2]);
                v_profile(pocket_r + wall, v_apex - wall * sqrt(2), height + 2);
            }
        }
    }
}

// The window, the slits with their grooves, and the hollows between them.
module sheet_cuts() {
    translate([-clear_a / 2, -1, -1]) cube([clear_a, front_lip + 1 + eps, apron_z + 1]);
    translate([-clear_a / 2, front_lip, -1]) cube([clear_a, y_j - front_lip + eps, height - top + 1]);
    union() for (i = [0 : n - 1]) {
        slit(pocket_a, c[i] - slot[i] / 2, c[i] + slot[i] / 2, stop_height);
        // a wide tooth is hollow between two ribs; the light's wall needs no rib
        if (tooth(i) - (i < n - 1 ? 2 : 1) * rib >= 4)
            translate([-pocket_a / 2, c[i] + slot[i] / 2 + rib, -1])
                cube([pocket_a, tooth(i) - (i < n - 1 ? 2 : 1) * rib + (i < n - 1 ? 0 : eps), height - top + 1]);
    }
}

module board_cuts() {
    translate([-aperture / 2, y_j - 2 * eps, -1]) cube([aperture, jw + 4 * eps, aperture_z + 1]);
    slit(pocket_b, y_slit, y_room, stop_height);
    // the room behind the board, and the way under its slit: the stops stay at the sides only
    translate([-clear_b / 2, y_slit - eps, -1]) cube([clear_b, board_slot + board_back + eps, height - top + 1]);
    if (plug_notch > 0 && !landscape)
        translate([-plug_notch / 2, y_slit, height - top - eps]) cube([plug_notch, y_back - y_slit, top + 1]);
    if (plug_notch > 0 && landscape) {
        // the socket's way down behind the board's right edge, and the plug's window
        translate([pocket_b / 2 - 10, y_slit, plug_z - plug_notch / 2]) cube([10, y_back - y_slit, height]);
        translate([pocket_b / 2 - eps, y_slit, plug_z - plug_notch / 2]) cube([wall + 1, y_back - y_slit, plug_notch]);
    }
    if (vents) union() for (x = [-floor((clear_b / 2 - 10) / 9) * 9 : 9 : clear_b / 2 - 10])
        translate([x - 1.5, y_back - eps, 0.22 * height]) cube([3, wall + 1, 0.6 * height]);
}

module puck_cuts() {
    // the lens's slot, open to the top: the puck drops in from there
    along_y(y_j - eps, y_slit + eps) union() {
        translate([0, puck_z]) circle(r = contact_r);
        translate([-contact_r, puck_z]) square([2 * contact_r, height]);
    }
    along_y(y_slit, y_slit + pocket_depth) v_profile(pocket_r, v_apex, height + 1);
    along_y(y_slit + pocket_depth - eps, depth + 1) translate([0, puck_z]) circle(d = press_d);
}

module assembly() {
    color("#F4EFE3") box();
    for (i = [0 : n - 1]) color("#FFFFFF", 0.7)
        translate([-sheet_x / 2, c[i] - t[i] / 2, stop_height]) difference() {
            cube([sheet_x, t[i], sheet_y]);
            // a window, as a sheet with a frame has one
            if (i < n - 1) translate([8 + 2 * i, -1, 8 + 2 * i]) cube([sheet_x - 16 - 4 * i, t[i] + 2, sheet_y - 16 - 4 * i]);
        }
    if (is_board) color("#3A7D5A") translate([-board[0] / 2, y_slit + 0.7, stop_height]) cube([board[0], 1.6, board[1]]);
    // the puck, its lens to the front
    else translate([0, y_slit + lens_z(contact_r) + puck_play / 2 + puck_edge_height, puck_z]) rotate([90, 0, 0]) {
        color("#DDDDDD") cylinder(r = puck_r, h = puck_edge_height);
        color("#FFF6D8") intersection() {
            translate([0, 0, puck_height - dome_R]) sphere(r = dome_R);
            translate([0, 0, puck_edge_height]) cylinder(r = dome_r, h = dome_h + 1);
        }
    }
}

// ---- logo ----
// The VeryOS logo at the size of veryos_logo.svg, as in veryos_logo_cube: a
// ring and the two arms of a V, all logo_stroke wide.
logo_r = 15.6264133379;
logo_stroke = 5;
logo_angle = 22.5;
logo_b = logo_r * (1 - sin(logo_angle)) / cos(logo_angle);
logo_arm = (2 * logo_r - logo_stroke / 2 * (1 + sin(logo_angle))) / cos(logo_angle);
logo_w = 2 * (logo_b + logo_arm * sin(logo_angle));
ring_in = logo_r - logo_stroke;
s_small = (2 * ring_in - logo_stroke) / 4;
s_big = s_small + logo_stroke;

// Engraving, width wide, centred on the origin, logo_depth into z < 0.
module logo_cut(width) {
    translate([0, 0, -logo_depth]) linear_extrude(logo_depth + 1)
        scale(width / logo_w) translate([0, -logo_r]) logo();
}

module logo() {
    difference() {
        union() {
            translate([0, logo_r]) circle(r = logo_r);
            for (m = [0, 1]) mirror([m, 0])
                translate([logo_b, 0]) rotate(-logo_angle)
                    translate([-logo_stroke, 0]) square([logo_stroke, logo_arm]);
            polygon([[-logo_b, 0], [logo_b, 0],
                     [logo_b + logo_r * tan(logo_angle), logo_r],
                     [-logo_b - logo_r * tan(logo_angle), logo_r]]);
        }
        translate([0, logo_r]) union() for (a = [0, 180]) rotate(a) s_hole();
    }
}

module s_hole() {
    difference() {
        intersection() {
            circle(r = ring_in);
            translate([0, -ring_in]) square(2 * ring_in);
        }
        translate([0, -(ring_in - s_small)]) circle(r = s_big);
    }
    translate([0, ring_in - s_small]) circle(r = s_small);
}
